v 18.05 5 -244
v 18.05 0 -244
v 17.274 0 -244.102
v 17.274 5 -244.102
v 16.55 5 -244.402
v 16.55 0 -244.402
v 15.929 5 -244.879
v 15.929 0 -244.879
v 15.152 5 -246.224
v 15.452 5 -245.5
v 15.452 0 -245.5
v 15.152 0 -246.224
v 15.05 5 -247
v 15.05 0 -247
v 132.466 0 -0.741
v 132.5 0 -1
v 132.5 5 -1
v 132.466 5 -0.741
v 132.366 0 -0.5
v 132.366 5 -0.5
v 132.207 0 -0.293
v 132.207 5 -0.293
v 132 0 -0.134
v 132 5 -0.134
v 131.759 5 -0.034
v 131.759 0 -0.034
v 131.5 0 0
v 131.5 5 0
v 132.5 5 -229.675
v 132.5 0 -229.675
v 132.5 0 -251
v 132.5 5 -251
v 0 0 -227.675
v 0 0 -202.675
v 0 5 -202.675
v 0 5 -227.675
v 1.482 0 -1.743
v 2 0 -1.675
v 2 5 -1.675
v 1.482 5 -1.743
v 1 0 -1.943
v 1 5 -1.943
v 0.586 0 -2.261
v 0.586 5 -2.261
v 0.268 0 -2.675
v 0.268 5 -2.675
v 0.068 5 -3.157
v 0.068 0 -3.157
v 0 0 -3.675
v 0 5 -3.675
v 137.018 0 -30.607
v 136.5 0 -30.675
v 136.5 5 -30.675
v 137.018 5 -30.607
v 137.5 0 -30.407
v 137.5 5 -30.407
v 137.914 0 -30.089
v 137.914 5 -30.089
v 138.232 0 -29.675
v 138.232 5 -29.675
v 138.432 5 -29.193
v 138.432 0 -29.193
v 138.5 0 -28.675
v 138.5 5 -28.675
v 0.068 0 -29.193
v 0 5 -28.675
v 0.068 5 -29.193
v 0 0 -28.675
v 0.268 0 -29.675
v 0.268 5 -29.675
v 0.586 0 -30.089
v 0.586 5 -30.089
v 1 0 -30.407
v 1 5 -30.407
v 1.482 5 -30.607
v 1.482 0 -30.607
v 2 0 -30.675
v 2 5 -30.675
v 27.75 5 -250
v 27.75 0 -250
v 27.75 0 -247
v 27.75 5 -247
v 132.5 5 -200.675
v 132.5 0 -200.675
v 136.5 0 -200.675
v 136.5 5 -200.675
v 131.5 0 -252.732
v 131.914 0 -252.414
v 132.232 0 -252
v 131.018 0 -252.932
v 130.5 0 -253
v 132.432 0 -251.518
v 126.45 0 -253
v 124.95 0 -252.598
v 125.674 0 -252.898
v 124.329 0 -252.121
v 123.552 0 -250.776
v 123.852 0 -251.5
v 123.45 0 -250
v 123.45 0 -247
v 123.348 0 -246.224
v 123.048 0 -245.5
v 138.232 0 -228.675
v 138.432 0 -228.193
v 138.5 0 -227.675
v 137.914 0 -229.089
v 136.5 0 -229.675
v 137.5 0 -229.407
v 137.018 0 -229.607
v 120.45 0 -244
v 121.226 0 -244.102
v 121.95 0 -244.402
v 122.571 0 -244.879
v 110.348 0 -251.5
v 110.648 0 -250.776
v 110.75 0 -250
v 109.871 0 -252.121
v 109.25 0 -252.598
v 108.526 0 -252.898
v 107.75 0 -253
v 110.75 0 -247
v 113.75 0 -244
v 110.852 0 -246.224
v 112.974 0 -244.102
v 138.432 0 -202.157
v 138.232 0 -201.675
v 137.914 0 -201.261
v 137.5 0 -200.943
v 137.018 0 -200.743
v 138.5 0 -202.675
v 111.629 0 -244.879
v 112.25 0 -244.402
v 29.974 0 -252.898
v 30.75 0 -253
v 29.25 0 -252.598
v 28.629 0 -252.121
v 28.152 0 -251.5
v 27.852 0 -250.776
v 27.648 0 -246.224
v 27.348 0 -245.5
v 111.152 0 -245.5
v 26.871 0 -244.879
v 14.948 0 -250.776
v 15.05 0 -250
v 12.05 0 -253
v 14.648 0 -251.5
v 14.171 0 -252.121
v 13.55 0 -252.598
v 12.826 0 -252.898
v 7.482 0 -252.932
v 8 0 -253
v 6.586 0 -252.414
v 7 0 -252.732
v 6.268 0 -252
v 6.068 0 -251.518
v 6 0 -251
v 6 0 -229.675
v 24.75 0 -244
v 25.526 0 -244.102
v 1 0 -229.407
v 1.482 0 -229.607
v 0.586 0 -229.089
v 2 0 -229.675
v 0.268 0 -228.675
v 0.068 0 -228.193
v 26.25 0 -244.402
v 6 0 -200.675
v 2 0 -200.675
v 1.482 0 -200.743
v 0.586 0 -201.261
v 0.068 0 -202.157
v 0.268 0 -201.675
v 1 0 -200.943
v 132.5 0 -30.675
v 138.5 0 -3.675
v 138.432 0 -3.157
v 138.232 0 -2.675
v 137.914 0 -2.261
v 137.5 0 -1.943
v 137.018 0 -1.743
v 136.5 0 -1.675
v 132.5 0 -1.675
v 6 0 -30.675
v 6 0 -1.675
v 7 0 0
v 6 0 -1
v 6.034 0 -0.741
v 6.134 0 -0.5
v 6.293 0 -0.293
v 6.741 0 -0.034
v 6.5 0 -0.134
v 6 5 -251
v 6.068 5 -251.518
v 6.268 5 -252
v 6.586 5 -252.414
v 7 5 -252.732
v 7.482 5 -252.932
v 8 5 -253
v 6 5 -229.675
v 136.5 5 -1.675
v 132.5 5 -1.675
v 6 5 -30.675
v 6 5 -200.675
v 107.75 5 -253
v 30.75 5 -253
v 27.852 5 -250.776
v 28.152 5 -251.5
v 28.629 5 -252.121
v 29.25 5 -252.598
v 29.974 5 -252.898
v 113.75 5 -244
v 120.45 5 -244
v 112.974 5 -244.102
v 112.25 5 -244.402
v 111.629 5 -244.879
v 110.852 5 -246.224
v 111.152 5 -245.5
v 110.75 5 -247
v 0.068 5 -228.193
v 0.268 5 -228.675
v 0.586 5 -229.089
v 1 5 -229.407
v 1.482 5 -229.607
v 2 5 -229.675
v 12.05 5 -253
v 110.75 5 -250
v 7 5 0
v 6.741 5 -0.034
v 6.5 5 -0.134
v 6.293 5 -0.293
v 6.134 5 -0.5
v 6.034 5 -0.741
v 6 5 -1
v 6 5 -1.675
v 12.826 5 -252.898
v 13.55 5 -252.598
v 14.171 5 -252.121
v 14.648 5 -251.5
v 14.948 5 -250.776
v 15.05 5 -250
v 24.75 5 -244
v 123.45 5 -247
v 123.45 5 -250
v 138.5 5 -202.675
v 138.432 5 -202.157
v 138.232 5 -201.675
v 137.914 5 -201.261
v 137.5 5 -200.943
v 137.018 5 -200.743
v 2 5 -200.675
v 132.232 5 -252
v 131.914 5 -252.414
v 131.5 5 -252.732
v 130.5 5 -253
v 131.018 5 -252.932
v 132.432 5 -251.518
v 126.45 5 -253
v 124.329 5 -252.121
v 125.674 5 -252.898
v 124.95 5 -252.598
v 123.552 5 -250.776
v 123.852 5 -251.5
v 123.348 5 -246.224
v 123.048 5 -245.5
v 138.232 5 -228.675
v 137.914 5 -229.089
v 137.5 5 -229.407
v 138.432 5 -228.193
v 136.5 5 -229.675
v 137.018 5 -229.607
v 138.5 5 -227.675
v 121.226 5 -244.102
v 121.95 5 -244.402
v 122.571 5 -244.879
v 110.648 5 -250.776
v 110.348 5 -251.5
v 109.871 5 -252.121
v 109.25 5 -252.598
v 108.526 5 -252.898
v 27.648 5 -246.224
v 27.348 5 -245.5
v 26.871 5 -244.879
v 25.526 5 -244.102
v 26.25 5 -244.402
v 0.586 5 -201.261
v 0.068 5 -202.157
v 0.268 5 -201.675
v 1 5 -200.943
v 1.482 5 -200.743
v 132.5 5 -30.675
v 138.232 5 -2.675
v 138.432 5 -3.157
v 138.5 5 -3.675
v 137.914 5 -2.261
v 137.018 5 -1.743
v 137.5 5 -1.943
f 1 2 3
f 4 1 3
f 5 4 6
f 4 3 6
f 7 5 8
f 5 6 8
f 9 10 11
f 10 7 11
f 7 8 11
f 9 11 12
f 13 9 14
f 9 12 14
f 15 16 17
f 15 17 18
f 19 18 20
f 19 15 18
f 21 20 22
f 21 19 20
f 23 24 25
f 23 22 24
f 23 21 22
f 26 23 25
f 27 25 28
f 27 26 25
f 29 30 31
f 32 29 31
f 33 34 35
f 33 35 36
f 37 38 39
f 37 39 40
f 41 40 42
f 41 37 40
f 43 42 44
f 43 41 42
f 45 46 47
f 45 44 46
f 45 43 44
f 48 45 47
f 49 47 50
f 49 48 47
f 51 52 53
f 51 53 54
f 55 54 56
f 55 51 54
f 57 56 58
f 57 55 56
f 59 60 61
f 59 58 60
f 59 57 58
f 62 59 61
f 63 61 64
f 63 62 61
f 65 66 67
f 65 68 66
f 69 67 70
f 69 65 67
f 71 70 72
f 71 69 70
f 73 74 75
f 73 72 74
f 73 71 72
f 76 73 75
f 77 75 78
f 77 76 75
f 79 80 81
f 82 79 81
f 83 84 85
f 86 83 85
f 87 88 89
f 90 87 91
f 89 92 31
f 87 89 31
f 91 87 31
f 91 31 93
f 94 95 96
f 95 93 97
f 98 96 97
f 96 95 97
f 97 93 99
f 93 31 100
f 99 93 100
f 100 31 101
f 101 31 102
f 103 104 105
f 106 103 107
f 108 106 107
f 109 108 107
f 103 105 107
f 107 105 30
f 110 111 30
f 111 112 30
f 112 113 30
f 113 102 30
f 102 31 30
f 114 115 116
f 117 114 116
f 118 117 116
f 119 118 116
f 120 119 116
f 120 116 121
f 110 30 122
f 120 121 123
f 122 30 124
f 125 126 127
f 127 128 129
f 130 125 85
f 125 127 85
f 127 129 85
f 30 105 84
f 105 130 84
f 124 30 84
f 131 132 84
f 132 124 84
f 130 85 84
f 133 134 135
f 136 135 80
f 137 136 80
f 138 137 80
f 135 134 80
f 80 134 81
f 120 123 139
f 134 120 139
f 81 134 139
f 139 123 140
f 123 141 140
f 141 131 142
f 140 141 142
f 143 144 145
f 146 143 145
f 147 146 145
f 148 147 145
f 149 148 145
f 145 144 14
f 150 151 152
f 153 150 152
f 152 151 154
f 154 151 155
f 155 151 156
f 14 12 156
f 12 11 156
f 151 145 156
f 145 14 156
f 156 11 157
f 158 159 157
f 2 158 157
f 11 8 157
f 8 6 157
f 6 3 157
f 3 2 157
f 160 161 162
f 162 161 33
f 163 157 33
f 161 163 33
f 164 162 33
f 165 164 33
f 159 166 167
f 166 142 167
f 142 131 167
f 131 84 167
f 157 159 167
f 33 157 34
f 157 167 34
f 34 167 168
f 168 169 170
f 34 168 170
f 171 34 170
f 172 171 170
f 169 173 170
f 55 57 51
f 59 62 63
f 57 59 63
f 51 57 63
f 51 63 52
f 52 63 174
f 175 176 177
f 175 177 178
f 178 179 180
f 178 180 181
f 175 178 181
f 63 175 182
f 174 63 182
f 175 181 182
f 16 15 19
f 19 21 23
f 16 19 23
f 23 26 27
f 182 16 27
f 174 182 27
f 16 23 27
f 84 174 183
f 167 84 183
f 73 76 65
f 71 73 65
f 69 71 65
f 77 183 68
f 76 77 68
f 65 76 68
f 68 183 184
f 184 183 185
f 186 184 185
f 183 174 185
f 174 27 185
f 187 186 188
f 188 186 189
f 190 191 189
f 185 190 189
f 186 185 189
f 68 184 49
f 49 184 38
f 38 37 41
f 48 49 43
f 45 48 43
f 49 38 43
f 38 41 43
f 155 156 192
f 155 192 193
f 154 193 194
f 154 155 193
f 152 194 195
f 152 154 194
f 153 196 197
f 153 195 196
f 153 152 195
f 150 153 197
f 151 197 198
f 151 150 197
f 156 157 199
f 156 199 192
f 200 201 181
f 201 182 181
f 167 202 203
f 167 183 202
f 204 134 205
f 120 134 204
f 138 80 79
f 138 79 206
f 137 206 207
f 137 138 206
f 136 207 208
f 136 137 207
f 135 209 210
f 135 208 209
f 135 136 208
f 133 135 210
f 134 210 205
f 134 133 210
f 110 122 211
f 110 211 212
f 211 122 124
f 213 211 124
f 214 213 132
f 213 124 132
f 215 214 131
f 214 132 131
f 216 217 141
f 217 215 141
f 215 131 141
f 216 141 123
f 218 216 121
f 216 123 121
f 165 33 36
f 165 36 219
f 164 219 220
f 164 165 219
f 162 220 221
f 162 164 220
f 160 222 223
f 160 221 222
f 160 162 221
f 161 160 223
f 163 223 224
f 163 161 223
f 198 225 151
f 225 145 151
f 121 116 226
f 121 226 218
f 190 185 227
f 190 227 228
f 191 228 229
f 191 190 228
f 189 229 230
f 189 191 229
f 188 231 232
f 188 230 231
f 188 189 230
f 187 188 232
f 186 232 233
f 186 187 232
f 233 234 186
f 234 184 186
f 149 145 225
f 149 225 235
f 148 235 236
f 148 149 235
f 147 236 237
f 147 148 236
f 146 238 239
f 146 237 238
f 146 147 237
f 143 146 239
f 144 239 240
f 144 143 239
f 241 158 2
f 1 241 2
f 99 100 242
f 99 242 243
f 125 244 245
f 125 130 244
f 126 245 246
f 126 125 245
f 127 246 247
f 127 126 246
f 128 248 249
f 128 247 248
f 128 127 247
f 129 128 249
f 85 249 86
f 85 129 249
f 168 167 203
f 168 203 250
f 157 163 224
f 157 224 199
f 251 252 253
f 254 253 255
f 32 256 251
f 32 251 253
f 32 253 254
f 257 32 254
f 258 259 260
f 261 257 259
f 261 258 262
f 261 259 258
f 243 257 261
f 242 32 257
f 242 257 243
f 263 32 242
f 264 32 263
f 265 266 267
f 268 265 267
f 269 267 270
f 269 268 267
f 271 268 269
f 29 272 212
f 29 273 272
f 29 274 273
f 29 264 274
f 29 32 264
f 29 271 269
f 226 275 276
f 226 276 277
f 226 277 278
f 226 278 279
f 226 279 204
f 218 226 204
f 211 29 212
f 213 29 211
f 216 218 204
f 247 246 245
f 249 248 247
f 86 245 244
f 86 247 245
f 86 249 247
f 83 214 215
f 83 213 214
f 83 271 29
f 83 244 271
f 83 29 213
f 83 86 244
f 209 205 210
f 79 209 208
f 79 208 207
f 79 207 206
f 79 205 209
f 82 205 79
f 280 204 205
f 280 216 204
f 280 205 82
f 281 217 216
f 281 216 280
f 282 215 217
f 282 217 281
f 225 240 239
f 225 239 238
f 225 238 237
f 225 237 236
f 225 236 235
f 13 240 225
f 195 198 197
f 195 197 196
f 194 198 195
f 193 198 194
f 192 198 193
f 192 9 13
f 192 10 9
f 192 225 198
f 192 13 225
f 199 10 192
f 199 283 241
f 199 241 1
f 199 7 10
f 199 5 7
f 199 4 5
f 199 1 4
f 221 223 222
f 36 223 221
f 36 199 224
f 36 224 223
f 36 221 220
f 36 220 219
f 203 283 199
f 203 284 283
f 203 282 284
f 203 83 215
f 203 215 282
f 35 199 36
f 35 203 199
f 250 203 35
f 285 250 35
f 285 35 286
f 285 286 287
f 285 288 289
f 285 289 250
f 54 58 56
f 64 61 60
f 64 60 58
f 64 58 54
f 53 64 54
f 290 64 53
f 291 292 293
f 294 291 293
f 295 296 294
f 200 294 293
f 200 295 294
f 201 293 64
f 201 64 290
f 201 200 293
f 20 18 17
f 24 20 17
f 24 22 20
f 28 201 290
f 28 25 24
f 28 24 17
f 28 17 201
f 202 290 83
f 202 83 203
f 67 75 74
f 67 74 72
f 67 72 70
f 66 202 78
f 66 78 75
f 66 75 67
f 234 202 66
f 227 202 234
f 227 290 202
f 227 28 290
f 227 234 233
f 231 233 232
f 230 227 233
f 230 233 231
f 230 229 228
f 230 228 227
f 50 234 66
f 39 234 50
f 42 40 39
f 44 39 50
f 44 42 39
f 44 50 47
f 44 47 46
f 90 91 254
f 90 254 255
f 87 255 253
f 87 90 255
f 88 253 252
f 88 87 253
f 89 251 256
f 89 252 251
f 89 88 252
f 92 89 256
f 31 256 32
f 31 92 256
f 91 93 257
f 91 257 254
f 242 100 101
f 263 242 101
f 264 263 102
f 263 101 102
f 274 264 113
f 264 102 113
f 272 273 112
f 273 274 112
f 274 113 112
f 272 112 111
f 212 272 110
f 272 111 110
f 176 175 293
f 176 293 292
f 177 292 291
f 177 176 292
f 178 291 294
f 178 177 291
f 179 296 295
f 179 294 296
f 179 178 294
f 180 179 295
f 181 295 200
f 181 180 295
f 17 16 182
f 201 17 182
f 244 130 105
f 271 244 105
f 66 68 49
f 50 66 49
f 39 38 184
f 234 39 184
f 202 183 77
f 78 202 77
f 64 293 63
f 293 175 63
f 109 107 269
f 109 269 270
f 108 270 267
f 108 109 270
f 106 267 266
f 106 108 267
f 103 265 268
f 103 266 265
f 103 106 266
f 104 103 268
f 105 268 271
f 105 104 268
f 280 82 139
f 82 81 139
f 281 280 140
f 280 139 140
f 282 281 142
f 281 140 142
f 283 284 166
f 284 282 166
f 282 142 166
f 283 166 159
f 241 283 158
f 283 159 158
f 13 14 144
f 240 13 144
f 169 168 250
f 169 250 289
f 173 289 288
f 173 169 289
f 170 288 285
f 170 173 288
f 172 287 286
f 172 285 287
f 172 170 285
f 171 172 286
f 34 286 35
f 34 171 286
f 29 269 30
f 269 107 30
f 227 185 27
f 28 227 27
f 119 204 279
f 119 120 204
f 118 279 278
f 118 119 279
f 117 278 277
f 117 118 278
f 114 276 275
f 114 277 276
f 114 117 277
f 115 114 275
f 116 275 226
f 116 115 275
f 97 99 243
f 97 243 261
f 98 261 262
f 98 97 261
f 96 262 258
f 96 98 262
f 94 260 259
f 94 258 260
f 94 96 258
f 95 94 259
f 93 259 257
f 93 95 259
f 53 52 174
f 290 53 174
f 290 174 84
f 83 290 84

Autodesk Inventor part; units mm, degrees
ref_plane "YZ Plane" through (0, 0, 0) normal (1, 0, 0) x (0, 1, 0)
ref_plane "XZ Plane" through (0, 0, 0) normal (0, 1, 0) x (-1, 0, 0)
ref_plane "XY Plane" through (0, 0, 0) normal (0, 0, 1) x (1, 0, 0)
sketch "Sketch1" plane through (0, 0, 0) normal (0, 1, 0) x (-1, 0, 0)
  line L0 (-2, -229.675) -> (-6, -229.675)
  line L1 (-6, -200.675) -> (-2, -200.675)
  line L2 (0, -202.675) -> (0, -227.675)
  line L3 (-6, -30.675) -> (-2, -30.675)
  line L4 (0, -28.675) -> (0, -3.675)
  line L5 (-2, -1.675) -> (-6, -1.675)
  arc A0 (0, -3.675) -> (-2, -1.675) centre (-2, -3.675) ccw
  arc A1 (-2, -30.675) -> (0, -28.675) centre (-2, -28.675) ccw
  arc A2 (0, -202.675) -> (-2, -200.675) centre (-2, -202.675) ccw
  arc A3 (-2, -229.675) -> (0, -227.675) centre (-2, -227.675) ccw
  line L6 (-136.5, -229.675) -> (-132.5, -229.675)
  line L7 (-132.5, -200.675) -> (-136.5, -200.675)
  line L8 (-138.5, -202.675) -> (-138.5, -227.675)
  line L9 (-136.5, -30.675) -> (-132.5, -30.675)
  line L10 (-132.5, -1.675) -> (-136.5, -1.675)
  line L11 (-138.5, -3.675) -> (-138.5, -28.675)
  arc A4 (-136.5, -1.675) -> (-138.5, -3.675) centre (-136.5, -3.675) ccw
  arc A5 (-138.5, -28.675) -> (-136.5, -30.675) centre (-136.5, -28.675) ccw
  arc A6 (-136.5, -200.675) -> (-138.5, -202.675) centre (-136.5, -202.675) ccw
  arc A7 (-138.5, -227.675) -> (-136.5, -229.675) centre (-136.5, -227.675) ccw
  line L12 (-27.75, -250) -> (-27.75, -247)
  line L13 (-110.75, -250) -> (-110.75, -247)
  line L14 (-30.75, -253) -> (-107.75, -253)
  line L15 (0, -215.175) -> (-138.5, -215.175) construction
  line L16 (-113.75, -244) -> (-120.45, -244)
  line L17 (-123.45, -247) -> (-123.45, -250)
  line L18 (-126.45, -253) -> (-127.7679, -253)
  line L19 (-24.75, -244) -> (-18.05, -244)
  line L20 (-15.05, -247) -> (-15.05, -250)
  line L21 (-12.05, -253) -> (-8, -253)
  arc A8 (-15.05, -250) -> (-12.05, -253) centre (-12.05, -250) ccw
  arc A9 (-15.05, -247) -> (-18.05, -244) centre (-18.05, -247) ccw
  arc A10 (-24.75, -244) -> (-27.75, -247) centre (-24.75, -247) ccw
  arc A11 (-30.75, -253) -> (-27.75, -250) centre (-30.75, -250) ccw
  arc A12 (-110.75, -250) -> (-107.75, -253) centre (-107.75, -250) ccw
  arc A13 (-110.75, -247) -> (-113.75, -244) centre (-113.75, -247) ccw
  arc A14 (-120.45, -244) -> (-123.45, -247) centre (-120.45, -247) ccw
  arc A15 (-126.45, -253) -> (-123.45, -250) centre (-126.45, -250) ccw
  line L22 (-7.5, 0) -> (-128.9984, 0)
  line L23 (-6, -229.675) -> (-6, -251)
  line L24 (-6, -30.675) -> (-6, -200.675)
  line L25 (-132.5, -30.675) -> (-132.5, -200.675)
  line L26 (-132.5, -229.675) -> (-132.5, -91)
  line L27 (-128.9984, 0) -> (-131.5, 0)
  line L28 (-132.5, -1) -> (-132.5, -1.675)
  arc A16 (-131.5, 0) -> (-132.5, -1) centre (-131.5, -1) ccw
  line L29 (-6, -1.675) -> (-6, -1)
  line L30 (-6, 0) -> (-6, 0)
  line L31 (-7, 0) -> (-7.5, 0)
  arc A17 (-6, -1) -> (-7, 0) centre (-7, -1) ccw
  line L32 (-132.5, -91) -> (-132.5, -251)
  line L33 (-130.5, -253) -> (-127.109, -253)
  arc A18 (-132.5, -251) -> (-130.5, -253) centre (-130.5, -251) ccw
  line L34 (-4.5, -253) -> (-10.025, -253)
  arc A19 (-8, -253) -> (-6, -251) centre (-8, -251) ccw
  point P0 (0, 0)
  point P1 (0, -229.675)
  point P2 (-4, -229.675)
  point P3 (-138.5, -200.675)
  point P4 (-138.5, -30.675)
  point P5 (-134.5, -229.675)
  point P6 (-132.5, -253)
  point P7 (-27.75, -253)
  point P8 (-27.75, -244)
  point P9 (-110.75, -253)
  point P10 (-110.75, -244)
  point P11 (-69.25, -253)
  point P12 (-69.25, -215.175)
  point P13 (-123.45, -244)
  point P14 (-15.05, -244)
  point P15 (-6.4873, -253)
  point P16 (-6, -91.775)
  point P17 (-4, -1.675)
  point P18 (-134.5, -1.675)
  point P19 (0, -16.175)
  point P20 (-6, -240.3375)
  point P21 (-6, -115.675)
  point P22 (-132.5, -160.3375)
  point P23 (-132.5, -115.675)
  point P24 (-138.5, -16.175)
  point P25 (-132.5, -1.3375)
  point P26 (-134.5, -30.675)
  point P27 (-4, -30.675)
  point P28 (-4, -200.675)
  point P29 (-134.5, -200.675)
  dimension "d3" = 6
  dimension "d8" = 2
  dimension "d11" = 2
  dimension "d12" = 2
  dimension "d13" = 9
  dimension "d14" = 83
  dimension "d15" = 12.7
  dimension "d16" = 12.7
  dimension "d18" = 3
  dimension "d19" = 3
  dimension "d24" = 6
  dimension "d25" = 1
  dimension "d26" = 1
  dimension "d29" = 29
  dimension "d30" = 23.325
  dimension "d31" = 2
  dimension "d34" = 2
  dimension "d35" = 126.5
  dimension "d36" = 244
  dimension "d37" = 29
  dimension "d38" = 1.675
extrude "Extrusion1" add sketch "Sketch1" along normal blind 5
equation "\"d19\" = d18"
equation "\"d24\" = d3"
equation "\"d25\" = d26"
equation "\"d31\" = d17"
equation "\"d37\" = d29"
equation "\"d17\" = 2"
properties part number "back_wall"
